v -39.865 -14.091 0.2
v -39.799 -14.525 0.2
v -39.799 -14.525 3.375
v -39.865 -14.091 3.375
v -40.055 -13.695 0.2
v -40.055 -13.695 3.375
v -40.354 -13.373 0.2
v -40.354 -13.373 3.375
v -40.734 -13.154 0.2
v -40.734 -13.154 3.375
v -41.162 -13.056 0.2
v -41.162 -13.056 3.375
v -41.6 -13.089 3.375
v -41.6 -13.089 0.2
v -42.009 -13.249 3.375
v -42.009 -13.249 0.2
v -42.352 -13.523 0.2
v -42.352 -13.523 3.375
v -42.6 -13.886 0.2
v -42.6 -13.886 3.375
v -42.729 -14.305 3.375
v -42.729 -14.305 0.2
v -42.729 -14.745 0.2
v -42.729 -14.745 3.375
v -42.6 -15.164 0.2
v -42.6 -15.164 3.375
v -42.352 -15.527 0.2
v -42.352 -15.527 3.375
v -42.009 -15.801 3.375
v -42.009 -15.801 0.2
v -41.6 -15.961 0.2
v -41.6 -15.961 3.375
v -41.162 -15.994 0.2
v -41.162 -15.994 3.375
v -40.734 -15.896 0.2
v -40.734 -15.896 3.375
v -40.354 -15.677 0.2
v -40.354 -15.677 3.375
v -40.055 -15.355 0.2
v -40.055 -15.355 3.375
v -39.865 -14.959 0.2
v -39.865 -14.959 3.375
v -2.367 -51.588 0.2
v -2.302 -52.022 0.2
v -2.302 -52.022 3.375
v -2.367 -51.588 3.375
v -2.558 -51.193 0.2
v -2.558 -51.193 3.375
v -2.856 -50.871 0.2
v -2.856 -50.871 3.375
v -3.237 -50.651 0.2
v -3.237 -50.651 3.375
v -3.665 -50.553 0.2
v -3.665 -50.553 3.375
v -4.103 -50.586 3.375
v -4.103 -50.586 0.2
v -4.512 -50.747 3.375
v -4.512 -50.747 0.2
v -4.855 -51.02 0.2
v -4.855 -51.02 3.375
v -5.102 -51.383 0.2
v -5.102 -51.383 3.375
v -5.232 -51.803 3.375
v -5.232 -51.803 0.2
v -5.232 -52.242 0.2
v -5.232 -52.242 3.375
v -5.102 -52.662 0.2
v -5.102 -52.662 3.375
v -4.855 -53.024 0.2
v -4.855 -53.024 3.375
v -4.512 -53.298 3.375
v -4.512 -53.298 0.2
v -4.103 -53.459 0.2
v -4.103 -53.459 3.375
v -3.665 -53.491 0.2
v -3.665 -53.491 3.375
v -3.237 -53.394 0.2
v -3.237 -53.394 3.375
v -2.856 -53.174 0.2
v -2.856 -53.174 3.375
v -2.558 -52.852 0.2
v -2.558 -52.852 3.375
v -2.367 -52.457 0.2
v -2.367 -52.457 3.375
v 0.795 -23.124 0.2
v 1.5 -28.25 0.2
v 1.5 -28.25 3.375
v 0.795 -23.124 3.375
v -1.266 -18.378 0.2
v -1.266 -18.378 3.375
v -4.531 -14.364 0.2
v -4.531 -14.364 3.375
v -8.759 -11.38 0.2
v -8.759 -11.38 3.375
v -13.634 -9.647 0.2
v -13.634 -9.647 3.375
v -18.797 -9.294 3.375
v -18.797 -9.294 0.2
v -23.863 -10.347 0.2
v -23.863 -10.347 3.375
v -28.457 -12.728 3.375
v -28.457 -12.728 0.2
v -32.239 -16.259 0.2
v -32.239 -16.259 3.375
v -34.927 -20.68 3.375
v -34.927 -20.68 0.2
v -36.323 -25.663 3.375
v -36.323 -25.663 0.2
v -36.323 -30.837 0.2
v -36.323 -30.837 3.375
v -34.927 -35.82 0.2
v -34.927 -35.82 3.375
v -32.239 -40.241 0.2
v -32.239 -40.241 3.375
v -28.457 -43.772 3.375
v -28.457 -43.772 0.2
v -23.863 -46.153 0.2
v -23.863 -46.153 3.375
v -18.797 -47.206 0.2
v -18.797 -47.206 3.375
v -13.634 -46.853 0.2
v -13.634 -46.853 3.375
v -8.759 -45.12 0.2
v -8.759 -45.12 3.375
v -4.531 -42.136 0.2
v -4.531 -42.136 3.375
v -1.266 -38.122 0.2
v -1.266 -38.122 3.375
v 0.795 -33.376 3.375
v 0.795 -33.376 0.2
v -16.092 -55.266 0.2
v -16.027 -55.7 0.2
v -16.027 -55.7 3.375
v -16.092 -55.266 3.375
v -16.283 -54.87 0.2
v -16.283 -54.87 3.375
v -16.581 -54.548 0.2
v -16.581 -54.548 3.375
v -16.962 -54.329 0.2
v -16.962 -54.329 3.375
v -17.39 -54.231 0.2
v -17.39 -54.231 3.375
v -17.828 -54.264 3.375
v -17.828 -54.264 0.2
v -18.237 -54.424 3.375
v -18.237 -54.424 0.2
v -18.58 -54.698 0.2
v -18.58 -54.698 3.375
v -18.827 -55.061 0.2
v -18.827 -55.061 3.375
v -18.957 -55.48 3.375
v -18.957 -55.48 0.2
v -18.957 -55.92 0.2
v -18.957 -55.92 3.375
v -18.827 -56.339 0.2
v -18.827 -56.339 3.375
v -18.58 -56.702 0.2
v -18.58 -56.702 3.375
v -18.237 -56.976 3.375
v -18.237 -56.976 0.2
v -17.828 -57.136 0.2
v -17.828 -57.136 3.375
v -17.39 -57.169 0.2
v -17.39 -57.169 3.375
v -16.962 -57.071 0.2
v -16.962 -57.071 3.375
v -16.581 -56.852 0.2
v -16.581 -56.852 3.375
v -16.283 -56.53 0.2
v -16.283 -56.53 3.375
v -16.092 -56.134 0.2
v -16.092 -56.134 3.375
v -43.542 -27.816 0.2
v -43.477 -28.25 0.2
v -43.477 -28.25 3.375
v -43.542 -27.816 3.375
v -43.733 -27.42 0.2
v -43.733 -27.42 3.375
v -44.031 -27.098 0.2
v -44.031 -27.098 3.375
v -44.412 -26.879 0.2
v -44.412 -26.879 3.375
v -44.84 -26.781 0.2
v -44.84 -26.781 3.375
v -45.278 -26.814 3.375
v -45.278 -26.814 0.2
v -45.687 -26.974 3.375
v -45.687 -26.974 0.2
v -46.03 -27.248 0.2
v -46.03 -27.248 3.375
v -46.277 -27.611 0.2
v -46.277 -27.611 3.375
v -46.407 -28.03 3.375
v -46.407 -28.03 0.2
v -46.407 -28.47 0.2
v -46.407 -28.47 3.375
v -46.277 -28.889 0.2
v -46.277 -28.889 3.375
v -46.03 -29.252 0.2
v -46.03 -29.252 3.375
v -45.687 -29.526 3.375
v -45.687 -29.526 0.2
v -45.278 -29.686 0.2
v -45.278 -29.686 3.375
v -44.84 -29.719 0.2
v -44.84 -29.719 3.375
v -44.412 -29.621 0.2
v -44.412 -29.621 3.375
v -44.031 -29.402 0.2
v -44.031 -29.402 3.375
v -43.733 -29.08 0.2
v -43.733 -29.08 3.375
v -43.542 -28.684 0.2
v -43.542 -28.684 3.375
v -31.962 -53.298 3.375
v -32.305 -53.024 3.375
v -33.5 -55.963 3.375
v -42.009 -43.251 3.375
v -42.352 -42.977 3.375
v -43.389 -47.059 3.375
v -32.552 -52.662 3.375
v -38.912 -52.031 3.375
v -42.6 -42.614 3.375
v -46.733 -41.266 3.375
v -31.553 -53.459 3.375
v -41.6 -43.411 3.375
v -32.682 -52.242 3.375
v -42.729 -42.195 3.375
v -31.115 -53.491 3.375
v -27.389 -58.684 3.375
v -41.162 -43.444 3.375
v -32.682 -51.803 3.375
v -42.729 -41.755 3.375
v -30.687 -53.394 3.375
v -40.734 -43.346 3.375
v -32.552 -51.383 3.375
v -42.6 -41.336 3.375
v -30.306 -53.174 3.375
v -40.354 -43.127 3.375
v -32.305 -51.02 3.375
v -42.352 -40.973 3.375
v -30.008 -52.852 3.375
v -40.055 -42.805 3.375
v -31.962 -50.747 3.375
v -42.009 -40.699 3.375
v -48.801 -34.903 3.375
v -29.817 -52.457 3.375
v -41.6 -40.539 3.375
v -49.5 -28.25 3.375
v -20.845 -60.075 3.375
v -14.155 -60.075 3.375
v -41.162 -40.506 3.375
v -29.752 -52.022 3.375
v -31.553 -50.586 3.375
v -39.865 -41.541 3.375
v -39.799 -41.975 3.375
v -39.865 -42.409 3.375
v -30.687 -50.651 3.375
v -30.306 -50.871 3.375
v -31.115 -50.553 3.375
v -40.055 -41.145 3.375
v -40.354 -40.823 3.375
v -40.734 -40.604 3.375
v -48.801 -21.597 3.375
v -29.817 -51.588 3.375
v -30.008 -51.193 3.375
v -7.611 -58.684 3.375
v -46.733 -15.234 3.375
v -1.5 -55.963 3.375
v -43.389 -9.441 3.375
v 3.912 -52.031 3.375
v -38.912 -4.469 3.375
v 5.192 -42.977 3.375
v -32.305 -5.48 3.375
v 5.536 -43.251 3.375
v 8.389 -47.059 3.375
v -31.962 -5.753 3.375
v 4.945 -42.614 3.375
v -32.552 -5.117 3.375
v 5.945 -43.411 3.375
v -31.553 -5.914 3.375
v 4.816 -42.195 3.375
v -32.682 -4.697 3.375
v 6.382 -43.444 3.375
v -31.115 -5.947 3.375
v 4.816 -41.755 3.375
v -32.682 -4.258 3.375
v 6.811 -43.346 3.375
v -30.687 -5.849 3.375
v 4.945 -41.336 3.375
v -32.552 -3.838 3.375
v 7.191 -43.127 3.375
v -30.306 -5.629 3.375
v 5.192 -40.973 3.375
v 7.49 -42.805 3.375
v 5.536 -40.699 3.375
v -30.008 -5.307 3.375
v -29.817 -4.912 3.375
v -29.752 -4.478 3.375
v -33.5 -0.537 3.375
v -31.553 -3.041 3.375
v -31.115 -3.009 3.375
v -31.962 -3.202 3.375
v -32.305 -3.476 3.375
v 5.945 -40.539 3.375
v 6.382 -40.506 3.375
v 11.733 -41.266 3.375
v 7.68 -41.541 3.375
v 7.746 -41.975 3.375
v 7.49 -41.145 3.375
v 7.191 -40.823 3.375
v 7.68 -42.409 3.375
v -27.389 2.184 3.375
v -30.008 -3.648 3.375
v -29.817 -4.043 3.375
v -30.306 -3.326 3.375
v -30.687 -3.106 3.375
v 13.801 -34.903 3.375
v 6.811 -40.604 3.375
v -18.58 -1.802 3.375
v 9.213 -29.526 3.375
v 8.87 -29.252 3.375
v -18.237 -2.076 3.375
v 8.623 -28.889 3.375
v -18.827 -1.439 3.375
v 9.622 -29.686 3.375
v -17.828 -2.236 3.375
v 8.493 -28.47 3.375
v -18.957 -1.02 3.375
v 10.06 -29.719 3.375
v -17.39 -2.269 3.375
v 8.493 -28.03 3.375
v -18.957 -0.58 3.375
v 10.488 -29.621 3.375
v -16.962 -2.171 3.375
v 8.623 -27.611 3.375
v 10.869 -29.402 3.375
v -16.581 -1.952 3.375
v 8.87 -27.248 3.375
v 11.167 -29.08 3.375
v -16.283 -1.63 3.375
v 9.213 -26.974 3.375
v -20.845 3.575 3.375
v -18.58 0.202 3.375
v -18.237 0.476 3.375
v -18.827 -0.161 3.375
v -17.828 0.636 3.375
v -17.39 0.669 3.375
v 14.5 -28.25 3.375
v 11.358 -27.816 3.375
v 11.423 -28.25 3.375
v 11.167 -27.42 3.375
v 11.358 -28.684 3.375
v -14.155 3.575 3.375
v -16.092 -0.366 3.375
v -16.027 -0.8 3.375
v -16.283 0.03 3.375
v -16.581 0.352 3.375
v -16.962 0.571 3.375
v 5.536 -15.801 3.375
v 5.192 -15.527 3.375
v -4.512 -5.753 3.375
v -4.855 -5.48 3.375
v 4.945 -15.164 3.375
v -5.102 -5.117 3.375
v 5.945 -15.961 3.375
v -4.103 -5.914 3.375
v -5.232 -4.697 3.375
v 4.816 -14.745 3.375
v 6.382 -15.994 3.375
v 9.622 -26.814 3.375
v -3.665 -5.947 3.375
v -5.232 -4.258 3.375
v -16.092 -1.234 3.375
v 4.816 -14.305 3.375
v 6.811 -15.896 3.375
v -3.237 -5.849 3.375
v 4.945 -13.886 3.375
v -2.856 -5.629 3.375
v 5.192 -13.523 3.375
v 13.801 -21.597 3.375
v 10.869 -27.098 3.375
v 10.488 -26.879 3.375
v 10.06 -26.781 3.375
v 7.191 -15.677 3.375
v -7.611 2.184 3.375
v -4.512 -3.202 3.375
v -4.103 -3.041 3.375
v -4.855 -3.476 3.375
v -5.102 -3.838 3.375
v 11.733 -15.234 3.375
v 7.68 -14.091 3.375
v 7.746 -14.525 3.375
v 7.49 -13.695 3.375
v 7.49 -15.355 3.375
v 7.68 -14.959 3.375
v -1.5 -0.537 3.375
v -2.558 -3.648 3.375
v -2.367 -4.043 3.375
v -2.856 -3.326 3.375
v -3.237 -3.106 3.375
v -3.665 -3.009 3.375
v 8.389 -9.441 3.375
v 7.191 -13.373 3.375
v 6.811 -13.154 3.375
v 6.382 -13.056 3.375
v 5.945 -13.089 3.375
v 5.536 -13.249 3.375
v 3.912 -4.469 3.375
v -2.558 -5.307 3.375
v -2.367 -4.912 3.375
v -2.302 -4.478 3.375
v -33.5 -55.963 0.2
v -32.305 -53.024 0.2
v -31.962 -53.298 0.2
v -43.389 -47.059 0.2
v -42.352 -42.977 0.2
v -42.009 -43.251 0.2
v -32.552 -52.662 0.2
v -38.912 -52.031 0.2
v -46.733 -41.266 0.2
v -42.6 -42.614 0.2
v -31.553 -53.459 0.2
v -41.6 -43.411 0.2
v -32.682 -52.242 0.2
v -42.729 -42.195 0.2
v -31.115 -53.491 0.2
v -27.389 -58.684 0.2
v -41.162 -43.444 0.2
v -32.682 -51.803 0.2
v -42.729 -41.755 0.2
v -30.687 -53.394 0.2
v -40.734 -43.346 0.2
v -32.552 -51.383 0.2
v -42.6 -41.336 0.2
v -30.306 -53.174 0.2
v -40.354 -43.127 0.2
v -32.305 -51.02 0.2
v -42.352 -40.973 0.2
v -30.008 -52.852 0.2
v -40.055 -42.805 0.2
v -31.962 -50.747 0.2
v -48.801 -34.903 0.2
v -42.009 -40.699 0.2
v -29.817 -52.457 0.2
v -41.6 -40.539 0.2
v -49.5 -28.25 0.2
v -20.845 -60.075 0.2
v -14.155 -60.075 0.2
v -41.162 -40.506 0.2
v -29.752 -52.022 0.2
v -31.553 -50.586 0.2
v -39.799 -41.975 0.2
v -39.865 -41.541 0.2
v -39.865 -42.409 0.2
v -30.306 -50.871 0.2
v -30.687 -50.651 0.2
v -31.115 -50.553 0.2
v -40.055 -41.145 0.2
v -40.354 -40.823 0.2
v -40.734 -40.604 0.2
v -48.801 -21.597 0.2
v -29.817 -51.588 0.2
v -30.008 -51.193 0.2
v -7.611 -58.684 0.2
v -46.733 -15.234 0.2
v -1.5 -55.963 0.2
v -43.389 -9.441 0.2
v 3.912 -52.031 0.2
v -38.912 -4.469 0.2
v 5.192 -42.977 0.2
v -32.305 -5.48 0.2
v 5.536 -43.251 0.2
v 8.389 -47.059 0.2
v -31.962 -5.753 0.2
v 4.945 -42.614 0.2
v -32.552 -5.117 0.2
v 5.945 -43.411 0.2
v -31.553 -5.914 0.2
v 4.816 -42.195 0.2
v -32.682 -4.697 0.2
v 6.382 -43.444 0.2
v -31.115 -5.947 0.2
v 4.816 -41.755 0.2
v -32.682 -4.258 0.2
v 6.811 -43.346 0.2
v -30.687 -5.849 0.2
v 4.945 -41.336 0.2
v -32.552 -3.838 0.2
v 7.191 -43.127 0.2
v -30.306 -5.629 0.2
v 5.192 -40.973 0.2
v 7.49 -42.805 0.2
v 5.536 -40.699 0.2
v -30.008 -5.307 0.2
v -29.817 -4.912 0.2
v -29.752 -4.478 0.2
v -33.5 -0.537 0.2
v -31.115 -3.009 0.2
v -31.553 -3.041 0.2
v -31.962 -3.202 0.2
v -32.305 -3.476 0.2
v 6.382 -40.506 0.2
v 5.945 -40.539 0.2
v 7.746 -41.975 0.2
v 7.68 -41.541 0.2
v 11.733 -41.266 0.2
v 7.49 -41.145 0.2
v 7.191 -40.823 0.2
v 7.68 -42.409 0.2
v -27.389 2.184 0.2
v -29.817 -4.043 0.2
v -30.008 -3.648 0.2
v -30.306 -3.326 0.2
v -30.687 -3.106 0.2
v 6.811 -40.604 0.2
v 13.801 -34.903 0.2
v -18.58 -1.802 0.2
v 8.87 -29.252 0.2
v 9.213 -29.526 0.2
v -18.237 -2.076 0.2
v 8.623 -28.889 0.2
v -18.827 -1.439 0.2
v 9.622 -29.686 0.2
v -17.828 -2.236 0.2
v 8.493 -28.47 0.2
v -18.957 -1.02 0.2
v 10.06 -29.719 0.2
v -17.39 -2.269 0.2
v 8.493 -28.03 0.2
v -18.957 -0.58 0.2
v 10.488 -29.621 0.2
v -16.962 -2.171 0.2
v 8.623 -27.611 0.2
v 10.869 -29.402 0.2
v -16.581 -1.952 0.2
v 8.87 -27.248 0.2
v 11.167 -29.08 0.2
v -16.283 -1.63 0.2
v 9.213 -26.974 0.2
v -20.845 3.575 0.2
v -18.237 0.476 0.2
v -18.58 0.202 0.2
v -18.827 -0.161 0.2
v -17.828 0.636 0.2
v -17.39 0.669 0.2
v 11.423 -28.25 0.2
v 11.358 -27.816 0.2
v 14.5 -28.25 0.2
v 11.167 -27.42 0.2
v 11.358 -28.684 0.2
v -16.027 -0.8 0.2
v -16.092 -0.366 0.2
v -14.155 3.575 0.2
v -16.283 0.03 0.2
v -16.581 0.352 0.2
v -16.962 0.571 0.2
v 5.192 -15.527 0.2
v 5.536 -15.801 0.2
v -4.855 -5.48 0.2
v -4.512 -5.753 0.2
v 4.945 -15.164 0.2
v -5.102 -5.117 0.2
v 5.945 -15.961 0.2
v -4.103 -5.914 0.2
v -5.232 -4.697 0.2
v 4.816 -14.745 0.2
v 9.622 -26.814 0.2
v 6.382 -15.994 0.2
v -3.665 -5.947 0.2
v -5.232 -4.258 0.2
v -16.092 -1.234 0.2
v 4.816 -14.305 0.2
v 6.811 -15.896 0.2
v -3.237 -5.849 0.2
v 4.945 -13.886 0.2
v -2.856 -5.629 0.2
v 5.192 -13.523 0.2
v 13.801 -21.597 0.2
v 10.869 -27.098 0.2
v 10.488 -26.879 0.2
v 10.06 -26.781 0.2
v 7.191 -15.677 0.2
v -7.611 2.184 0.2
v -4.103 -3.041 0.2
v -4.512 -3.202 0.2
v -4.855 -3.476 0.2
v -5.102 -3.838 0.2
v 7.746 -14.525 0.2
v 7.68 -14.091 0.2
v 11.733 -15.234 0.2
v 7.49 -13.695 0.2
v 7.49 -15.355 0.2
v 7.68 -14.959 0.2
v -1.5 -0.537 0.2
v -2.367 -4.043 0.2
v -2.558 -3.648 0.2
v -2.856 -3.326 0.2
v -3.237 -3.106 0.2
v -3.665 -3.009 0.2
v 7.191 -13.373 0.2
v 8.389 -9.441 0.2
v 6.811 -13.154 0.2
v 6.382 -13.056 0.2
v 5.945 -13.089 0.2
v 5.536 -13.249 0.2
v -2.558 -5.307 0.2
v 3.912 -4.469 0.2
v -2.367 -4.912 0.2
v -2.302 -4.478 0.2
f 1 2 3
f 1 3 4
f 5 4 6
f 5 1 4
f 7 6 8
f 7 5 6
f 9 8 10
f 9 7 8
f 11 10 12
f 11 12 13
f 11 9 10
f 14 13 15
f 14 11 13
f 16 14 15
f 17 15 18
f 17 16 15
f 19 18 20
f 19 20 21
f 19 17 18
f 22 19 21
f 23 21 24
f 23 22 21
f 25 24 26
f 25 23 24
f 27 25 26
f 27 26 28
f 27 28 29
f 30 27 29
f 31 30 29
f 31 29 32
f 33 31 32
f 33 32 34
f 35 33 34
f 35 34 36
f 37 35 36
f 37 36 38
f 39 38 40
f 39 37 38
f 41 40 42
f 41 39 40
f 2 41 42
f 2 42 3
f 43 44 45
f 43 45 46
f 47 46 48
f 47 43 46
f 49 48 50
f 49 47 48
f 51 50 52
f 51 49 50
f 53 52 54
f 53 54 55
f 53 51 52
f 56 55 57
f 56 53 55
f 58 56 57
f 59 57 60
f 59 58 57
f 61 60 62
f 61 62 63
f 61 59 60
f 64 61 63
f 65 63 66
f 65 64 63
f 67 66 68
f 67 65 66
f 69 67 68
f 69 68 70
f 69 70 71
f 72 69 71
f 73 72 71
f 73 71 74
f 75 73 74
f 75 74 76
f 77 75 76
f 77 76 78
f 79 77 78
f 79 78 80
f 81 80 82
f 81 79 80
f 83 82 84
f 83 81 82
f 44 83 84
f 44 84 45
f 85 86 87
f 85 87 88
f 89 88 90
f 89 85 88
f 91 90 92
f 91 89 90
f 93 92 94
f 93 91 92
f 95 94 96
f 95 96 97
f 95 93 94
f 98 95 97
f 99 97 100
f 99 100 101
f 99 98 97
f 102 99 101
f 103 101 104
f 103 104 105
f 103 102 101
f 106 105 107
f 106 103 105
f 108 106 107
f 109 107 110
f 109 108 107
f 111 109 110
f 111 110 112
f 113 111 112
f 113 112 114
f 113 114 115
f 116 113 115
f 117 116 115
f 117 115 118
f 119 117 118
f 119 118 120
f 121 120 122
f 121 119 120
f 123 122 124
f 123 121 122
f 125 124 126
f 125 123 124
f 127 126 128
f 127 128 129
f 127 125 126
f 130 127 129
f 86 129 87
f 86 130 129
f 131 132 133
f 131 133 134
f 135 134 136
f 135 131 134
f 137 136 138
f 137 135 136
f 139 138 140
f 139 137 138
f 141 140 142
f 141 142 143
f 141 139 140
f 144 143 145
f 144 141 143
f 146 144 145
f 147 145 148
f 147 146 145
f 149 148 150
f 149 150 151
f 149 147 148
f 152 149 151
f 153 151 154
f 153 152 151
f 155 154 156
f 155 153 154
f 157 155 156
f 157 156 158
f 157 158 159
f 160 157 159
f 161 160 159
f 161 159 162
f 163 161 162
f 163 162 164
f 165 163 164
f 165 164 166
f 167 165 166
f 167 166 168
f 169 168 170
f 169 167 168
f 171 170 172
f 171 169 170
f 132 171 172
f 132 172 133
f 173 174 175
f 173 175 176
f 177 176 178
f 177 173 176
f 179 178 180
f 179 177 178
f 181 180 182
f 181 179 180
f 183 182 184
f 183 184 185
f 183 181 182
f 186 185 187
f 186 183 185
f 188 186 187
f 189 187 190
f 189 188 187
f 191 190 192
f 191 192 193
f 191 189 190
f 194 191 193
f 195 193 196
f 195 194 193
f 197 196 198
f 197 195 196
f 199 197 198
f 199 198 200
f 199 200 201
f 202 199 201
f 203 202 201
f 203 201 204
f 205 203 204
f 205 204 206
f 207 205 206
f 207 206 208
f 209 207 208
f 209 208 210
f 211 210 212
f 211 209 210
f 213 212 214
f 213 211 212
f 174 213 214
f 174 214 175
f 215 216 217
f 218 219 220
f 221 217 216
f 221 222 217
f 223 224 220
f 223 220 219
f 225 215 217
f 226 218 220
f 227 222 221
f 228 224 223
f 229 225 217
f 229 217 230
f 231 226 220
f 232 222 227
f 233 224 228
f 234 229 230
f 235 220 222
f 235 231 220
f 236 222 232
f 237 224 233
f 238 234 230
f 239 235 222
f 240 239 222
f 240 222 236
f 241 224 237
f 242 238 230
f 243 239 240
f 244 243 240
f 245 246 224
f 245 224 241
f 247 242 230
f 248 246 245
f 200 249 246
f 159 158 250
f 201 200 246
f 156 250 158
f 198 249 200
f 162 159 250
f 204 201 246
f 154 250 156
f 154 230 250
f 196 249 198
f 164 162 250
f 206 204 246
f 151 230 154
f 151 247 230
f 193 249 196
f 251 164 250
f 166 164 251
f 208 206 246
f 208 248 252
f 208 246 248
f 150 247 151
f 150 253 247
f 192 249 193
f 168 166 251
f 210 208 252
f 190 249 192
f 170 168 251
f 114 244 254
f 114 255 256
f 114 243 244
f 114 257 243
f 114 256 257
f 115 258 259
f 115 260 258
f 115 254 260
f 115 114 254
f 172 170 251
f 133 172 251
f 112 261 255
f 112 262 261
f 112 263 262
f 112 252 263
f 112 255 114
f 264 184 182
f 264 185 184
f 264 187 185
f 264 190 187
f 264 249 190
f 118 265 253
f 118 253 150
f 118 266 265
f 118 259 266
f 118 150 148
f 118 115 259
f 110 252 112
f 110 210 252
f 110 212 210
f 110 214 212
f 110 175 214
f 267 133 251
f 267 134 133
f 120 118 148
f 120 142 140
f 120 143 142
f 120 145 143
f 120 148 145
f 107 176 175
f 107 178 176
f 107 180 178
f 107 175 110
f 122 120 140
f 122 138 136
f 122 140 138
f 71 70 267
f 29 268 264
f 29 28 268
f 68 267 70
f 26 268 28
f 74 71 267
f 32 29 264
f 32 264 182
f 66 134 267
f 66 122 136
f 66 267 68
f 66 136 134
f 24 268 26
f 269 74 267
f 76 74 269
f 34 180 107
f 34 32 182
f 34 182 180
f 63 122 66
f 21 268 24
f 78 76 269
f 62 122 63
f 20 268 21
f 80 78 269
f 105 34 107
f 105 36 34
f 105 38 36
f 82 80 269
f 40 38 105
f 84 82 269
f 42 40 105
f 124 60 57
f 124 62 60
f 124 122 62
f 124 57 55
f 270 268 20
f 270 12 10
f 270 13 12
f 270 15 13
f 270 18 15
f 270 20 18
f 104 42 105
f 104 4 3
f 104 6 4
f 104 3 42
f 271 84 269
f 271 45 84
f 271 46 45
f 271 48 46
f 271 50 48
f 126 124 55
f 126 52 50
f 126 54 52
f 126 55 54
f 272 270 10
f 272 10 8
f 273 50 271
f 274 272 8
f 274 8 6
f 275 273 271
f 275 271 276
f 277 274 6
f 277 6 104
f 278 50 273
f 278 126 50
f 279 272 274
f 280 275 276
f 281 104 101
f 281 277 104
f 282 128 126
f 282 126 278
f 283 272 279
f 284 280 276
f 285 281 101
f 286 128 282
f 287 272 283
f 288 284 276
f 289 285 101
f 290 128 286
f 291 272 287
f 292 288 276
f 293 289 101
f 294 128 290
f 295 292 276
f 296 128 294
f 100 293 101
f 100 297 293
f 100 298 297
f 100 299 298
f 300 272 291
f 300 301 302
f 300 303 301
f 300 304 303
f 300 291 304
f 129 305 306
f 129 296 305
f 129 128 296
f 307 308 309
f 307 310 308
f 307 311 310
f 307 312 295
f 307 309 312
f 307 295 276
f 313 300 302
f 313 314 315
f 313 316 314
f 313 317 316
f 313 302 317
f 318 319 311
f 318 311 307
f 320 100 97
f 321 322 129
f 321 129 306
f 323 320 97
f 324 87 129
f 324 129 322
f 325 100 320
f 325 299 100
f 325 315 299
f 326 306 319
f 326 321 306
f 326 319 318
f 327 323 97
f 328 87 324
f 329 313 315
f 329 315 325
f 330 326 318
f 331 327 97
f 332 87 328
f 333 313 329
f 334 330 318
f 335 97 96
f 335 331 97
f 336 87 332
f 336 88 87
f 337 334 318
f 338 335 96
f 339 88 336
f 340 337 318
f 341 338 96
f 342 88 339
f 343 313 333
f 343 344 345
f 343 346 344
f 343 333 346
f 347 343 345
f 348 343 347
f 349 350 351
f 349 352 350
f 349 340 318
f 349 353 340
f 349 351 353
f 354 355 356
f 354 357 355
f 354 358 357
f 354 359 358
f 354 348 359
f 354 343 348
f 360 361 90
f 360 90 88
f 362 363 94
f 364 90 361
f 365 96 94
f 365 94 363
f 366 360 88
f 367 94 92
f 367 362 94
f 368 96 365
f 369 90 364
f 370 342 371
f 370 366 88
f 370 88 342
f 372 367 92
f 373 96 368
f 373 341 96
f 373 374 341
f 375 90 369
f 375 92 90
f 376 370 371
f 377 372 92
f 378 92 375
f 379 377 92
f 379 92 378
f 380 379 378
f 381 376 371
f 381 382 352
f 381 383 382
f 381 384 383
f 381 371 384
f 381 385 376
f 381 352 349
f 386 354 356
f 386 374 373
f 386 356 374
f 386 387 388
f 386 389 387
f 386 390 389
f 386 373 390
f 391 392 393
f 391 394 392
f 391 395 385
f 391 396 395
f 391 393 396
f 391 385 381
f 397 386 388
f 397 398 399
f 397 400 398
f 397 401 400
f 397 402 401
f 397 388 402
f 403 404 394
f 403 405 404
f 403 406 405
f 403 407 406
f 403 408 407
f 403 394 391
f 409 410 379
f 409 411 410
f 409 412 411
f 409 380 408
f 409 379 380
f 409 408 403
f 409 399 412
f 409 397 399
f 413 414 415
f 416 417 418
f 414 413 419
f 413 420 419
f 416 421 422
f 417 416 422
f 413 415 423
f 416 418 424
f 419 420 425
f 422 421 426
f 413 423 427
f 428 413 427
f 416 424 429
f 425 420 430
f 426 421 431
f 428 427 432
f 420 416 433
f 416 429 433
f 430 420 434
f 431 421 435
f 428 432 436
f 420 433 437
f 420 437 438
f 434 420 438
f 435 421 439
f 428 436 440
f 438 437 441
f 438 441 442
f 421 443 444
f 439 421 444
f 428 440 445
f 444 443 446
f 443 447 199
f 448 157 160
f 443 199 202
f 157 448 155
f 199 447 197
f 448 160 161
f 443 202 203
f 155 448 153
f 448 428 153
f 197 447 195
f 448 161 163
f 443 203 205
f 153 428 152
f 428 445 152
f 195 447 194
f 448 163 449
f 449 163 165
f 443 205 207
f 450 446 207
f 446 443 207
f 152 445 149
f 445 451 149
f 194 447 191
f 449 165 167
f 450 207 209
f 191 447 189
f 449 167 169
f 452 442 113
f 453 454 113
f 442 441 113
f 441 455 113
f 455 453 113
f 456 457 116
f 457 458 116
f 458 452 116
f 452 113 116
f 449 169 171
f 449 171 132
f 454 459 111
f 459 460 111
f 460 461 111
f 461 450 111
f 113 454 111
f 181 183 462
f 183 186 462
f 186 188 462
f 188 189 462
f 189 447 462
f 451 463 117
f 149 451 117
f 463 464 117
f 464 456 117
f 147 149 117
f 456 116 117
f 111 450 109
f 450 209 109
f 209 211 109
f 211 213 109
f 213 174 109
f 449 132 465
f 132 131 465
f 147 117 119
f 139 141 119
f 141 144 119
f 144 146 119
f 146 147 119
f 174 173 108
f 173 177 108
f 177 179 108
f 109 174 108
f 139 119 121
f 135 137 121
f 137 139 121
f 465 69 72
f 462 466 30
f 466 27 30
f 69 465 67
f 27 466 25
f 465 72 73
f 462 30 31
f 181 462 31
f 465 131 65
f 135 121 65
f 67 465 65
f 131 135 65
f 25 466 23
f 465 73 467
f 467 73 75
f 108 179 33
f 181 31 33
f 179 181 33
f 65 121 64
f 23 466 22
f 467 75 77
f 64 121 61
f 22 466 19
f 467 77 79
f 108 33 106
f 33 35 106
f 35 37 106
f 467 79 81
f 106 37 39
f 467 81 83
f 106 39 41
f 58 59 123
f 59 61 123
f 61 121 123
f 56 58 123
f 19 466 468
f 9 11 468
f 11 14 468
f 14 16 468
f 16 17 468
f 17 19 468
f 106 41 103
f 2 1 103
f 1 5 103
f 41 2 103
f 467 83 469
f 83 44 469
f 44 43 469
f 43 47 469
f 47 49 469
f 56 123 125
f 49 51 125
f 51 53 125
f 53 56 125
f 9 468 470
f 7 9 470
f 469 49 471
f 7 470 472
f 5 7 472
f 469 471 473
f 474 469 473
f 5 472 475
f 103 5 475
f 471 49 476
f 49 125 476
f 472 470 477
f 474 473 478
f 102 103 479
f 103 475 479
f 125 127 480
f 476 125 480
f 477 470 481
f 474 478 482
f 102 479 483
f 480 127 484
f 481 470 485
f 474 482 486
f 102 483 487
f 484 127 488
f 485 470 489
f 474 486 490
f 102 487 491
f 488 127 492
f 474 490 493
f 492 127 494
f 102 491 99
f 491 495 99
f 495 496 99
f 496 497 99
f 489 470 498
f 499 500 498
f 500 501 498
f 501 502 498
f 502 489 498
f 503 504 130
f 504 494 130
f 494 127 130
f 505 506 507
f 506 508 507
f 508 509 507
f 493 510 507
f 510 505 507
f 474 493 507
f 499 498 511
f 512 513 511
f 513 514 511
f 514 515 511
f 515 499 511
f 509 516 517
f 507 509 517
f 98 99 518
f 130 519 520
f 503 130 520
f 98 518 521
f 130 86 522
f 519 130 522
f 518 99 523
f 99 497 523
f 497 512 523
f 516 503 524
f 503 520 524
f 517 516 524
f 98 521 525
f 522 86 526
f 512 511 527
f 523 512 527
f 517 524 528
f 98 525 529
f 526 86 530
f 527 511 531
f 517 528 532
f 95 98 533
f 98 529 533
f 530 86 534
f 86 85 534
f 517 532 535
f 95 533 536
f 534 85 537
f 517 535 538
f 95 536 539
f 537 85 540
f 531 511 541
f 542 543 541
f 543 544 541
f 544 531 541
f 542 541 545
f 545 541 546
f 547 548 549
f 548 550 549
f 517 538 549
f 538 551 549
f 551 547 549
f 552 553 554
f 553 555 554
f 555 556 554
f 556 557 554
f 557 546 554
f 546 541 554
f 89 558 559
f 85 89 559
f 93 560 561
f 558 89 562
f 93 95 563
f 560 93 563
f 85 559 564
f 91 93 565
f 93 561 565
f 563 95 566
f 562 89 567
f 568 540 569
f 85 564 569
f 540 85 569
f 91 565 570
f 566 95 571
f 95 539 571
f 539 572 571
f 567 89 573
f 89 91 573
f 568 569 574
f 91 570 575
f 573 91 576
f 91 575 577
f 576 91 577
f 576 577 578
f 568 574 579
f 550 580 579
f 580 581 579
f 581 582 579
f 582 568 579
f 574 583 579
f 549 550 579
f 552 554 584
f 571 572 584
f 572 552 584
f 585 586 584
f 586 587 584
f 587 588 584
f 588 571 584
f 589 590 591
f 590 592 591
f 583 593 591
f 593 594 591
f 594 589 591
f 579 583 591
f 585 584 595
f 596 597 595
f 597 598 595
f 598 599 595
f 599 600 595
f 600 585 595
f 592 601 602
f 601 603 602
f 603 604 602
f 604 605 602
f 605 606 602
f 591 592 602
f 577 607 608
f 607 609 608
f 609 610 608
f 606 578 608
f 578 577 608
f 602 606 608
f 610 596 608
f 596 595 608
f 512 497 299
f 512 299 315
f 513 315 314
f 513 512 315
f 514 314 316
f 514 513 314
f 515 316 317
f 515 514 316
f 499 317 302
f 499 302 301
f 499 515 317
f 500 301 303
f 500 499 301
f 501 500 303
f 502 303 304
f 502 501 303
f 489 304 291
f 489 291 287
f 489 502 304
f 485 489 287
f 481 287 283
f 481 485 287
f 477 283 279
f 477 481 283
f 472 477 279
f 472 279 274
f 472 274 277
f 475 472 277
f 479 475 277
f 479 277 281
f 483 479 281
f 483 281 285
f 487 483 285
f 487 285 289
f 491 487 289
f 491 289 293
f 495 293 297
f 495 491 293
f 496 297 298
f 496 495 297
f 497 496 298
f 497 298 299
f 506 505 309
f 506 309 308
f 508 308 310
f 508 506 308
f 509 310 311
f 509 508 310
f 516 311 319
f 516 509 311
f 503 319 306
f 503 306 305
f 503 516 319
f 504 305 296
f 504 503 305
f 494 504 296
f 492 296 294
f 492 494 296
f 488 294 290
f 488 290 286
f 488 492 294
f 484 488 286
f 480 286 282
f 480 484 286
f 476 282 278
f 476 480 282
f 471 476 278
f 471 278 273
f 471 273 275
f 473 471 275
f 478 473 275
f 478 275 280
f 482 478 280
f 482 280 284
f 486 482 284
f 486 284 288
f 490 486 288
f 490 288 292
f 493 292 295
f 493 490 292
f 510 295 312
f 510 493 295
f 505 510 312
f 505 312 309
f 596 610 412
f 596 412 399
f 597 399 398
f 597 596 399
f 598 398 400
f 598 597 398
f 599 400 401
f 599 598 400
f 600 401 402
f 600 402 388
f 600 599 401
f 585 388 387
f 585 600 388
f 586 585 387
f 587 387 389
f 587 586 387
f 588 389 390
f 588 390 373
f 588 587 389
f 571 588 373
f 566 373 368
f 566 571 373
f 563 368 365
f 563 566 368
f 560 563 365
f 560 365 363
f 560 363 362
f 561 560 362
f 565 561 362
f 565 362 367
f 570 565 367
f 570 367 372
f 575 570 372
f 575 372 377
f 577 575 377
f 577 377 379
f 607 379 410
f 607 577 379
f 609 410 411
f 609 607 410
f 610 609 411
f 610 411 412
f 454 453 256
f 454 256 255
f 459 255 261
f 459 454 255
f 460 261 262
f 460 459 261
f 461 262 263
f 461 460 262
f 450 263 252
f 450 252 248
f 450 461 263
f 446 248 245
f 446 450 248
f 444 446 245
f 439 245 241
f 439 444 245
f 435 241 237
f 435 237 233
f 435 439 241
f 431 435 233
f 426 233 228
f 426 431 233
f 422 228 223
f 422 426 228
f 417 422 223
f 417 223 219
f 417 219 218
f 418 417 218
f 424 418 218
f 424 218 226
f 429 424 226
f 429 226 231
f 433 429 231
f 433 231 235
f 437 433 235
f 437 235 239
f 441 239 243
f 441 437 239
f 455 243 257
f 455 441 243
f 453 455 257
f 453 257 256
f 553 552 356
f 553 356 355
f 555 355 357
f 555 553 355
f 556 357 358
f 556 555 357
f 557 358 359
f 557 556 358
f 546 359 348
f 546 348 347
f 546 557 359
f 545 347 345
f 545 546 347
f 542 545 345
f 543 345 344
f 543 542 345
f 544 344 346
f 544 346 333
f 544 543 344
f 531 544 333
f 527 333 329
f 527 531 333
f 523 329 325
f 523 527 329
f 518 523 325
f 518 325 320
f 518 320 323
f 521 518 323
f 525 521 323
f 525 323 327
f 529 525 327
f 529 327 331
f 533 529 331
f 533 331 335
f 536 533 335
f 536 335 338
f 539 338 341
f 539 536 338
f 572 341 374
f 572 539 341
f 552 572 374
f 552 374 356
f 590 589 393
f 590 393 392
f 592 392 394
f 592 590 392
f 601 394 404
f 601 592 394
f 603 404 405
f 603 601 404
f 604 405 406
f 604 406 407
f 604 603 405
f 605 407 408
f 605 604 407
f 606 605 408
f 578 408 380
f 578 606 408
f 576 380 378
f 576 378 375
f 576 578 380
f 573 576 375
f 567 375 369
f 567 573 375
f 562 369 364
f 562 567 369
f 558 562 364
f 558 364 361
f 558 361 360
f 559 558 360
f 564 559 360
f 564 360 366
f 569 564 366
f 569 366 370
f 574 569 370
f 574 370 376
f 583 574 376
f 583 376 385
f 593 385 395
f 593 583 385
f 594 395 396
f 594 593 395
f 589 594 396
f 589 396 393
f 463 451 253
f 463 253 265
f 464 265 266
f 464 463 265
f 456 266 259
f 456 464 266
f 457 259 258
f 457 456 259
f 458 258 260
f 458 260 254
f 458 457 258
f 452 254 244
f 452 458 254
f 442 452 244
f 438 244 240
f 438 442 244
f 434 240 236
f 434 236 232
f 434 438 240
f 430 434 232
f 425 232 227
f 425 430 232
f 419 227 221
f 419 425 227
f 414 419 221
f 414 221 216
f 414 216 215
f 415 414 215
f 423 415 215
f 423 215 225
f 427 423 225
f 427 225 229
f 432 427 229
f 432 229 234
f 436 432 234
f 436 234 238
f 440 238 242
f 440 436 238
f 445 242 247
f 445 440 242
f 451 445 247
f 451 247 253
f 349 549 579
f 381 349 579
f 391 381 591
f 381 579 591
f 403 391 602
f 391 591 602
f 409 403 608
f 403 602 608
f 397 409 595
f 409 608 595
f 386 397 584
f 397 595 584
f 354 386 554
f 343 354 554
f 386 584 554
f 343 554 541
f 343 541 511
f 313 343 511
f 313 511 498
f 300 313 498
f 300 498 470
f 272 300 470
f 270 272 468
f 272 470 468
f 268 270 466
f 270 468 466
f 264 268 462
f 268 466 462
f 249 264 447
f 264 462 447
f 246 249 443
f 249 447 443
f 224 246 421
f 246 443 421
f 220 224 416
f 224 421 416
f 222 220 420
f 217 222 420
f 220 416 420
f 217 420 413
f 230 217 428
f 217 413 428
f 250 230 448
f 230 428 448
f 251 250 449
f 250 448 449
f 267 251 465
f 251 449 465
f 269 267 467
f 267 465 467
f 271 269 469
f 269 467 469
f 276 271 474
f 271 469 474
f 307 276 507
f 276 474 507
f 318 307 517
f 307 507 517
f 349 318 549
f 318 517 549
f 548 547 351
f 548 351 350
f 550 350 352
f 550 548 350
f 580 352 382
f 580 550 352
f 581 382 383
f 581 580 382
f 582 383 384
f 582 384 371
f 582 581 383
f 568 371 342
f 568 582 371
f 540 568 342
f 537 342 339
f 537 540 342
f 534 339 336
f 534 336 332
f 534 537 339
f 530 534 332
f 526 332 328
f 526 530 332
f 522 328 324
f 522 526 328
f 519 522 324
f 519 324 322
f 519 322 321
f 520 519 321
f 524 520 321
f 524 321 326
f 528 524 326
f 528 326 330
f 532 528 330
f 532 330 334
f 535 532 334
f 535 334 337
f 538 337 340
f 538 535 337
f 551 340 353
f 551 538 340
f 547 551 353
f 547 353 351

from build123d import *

# Parameters (mm, degrees)
SKETCH1_R           = 32
SKETCH1_R_2         = 1.4732
SKETCH1_R_3         = 19
BOSS_EXTRUDE1_DEPTH = 3.175


with BuildPart() as part:
    # Sketch1 → Boss-Extrude1 (new body)
    with BuildSketch(Plane.XY.offset(0.2)):
        with Locations((-17.5, -28.25)):
            Circle(SKETCH1_R)
        with Locations((-17.5, -55.7)):
            Circle(SKETCH1_R_2, mode=Mode.SUBTRACT)
        with Locations((-31.225, -52.022397334)):
            Circle(SKETCH1_R_2, mode=Mode.SUBTRACT)
        with Locations((-41.272397334, -41.975)):
            Circle(SKETCH1_R_2, mode=Mode.SUBTRACT)
        with Locations((-44.95, -28.25)):
            Circle(SKETCH1_R_2, mode=Mode.SUBTRACT)
        with Locations((-41.272397334, -14.525)):
            Circle(SKETCH1_R_2, mode=Mode.SUBTRACT)
        with Locations((-31.225, -4.477602666)):
            Circle(SKETCH1_R_2, mode=Mode.SUBTRACT)
        with Locations((-17.5, -0.8)):
            Circle(SKETCH1_R_2, mode=Mode.SUBTRACT)
        with Locations((-3.775, -4.477602666)):
            Circle(SKETCH1_R_2, mode=Mode.SUBTRACT)
        with Locations((6.272397334, -14.525)):
            Circle(SKETCH1_R_2, mode=Mode.SUBTRACT)
        with Locations((9.95, -28.25)):
            Circle(SKETCH1_R_2, mode=Mode.SUBTRACT)
        with Locations((6.272397334, -41.975)):
            Circle(SKETCH1_R_2, mode=Mode.SUBTRACT)
        with Locations((-3.775, -52.022397334)):
            Circle(SKETCH1_R_2, mode=Mode.SUBTRACT)
        with Locations((-17.5, -28.25)):
            Circle(SKETCH1_R_3, mode=Mode.SUBTRACT)
    extrude(amount=BOSS_EXTRUDE1_DEPTH)


solid = part.part
